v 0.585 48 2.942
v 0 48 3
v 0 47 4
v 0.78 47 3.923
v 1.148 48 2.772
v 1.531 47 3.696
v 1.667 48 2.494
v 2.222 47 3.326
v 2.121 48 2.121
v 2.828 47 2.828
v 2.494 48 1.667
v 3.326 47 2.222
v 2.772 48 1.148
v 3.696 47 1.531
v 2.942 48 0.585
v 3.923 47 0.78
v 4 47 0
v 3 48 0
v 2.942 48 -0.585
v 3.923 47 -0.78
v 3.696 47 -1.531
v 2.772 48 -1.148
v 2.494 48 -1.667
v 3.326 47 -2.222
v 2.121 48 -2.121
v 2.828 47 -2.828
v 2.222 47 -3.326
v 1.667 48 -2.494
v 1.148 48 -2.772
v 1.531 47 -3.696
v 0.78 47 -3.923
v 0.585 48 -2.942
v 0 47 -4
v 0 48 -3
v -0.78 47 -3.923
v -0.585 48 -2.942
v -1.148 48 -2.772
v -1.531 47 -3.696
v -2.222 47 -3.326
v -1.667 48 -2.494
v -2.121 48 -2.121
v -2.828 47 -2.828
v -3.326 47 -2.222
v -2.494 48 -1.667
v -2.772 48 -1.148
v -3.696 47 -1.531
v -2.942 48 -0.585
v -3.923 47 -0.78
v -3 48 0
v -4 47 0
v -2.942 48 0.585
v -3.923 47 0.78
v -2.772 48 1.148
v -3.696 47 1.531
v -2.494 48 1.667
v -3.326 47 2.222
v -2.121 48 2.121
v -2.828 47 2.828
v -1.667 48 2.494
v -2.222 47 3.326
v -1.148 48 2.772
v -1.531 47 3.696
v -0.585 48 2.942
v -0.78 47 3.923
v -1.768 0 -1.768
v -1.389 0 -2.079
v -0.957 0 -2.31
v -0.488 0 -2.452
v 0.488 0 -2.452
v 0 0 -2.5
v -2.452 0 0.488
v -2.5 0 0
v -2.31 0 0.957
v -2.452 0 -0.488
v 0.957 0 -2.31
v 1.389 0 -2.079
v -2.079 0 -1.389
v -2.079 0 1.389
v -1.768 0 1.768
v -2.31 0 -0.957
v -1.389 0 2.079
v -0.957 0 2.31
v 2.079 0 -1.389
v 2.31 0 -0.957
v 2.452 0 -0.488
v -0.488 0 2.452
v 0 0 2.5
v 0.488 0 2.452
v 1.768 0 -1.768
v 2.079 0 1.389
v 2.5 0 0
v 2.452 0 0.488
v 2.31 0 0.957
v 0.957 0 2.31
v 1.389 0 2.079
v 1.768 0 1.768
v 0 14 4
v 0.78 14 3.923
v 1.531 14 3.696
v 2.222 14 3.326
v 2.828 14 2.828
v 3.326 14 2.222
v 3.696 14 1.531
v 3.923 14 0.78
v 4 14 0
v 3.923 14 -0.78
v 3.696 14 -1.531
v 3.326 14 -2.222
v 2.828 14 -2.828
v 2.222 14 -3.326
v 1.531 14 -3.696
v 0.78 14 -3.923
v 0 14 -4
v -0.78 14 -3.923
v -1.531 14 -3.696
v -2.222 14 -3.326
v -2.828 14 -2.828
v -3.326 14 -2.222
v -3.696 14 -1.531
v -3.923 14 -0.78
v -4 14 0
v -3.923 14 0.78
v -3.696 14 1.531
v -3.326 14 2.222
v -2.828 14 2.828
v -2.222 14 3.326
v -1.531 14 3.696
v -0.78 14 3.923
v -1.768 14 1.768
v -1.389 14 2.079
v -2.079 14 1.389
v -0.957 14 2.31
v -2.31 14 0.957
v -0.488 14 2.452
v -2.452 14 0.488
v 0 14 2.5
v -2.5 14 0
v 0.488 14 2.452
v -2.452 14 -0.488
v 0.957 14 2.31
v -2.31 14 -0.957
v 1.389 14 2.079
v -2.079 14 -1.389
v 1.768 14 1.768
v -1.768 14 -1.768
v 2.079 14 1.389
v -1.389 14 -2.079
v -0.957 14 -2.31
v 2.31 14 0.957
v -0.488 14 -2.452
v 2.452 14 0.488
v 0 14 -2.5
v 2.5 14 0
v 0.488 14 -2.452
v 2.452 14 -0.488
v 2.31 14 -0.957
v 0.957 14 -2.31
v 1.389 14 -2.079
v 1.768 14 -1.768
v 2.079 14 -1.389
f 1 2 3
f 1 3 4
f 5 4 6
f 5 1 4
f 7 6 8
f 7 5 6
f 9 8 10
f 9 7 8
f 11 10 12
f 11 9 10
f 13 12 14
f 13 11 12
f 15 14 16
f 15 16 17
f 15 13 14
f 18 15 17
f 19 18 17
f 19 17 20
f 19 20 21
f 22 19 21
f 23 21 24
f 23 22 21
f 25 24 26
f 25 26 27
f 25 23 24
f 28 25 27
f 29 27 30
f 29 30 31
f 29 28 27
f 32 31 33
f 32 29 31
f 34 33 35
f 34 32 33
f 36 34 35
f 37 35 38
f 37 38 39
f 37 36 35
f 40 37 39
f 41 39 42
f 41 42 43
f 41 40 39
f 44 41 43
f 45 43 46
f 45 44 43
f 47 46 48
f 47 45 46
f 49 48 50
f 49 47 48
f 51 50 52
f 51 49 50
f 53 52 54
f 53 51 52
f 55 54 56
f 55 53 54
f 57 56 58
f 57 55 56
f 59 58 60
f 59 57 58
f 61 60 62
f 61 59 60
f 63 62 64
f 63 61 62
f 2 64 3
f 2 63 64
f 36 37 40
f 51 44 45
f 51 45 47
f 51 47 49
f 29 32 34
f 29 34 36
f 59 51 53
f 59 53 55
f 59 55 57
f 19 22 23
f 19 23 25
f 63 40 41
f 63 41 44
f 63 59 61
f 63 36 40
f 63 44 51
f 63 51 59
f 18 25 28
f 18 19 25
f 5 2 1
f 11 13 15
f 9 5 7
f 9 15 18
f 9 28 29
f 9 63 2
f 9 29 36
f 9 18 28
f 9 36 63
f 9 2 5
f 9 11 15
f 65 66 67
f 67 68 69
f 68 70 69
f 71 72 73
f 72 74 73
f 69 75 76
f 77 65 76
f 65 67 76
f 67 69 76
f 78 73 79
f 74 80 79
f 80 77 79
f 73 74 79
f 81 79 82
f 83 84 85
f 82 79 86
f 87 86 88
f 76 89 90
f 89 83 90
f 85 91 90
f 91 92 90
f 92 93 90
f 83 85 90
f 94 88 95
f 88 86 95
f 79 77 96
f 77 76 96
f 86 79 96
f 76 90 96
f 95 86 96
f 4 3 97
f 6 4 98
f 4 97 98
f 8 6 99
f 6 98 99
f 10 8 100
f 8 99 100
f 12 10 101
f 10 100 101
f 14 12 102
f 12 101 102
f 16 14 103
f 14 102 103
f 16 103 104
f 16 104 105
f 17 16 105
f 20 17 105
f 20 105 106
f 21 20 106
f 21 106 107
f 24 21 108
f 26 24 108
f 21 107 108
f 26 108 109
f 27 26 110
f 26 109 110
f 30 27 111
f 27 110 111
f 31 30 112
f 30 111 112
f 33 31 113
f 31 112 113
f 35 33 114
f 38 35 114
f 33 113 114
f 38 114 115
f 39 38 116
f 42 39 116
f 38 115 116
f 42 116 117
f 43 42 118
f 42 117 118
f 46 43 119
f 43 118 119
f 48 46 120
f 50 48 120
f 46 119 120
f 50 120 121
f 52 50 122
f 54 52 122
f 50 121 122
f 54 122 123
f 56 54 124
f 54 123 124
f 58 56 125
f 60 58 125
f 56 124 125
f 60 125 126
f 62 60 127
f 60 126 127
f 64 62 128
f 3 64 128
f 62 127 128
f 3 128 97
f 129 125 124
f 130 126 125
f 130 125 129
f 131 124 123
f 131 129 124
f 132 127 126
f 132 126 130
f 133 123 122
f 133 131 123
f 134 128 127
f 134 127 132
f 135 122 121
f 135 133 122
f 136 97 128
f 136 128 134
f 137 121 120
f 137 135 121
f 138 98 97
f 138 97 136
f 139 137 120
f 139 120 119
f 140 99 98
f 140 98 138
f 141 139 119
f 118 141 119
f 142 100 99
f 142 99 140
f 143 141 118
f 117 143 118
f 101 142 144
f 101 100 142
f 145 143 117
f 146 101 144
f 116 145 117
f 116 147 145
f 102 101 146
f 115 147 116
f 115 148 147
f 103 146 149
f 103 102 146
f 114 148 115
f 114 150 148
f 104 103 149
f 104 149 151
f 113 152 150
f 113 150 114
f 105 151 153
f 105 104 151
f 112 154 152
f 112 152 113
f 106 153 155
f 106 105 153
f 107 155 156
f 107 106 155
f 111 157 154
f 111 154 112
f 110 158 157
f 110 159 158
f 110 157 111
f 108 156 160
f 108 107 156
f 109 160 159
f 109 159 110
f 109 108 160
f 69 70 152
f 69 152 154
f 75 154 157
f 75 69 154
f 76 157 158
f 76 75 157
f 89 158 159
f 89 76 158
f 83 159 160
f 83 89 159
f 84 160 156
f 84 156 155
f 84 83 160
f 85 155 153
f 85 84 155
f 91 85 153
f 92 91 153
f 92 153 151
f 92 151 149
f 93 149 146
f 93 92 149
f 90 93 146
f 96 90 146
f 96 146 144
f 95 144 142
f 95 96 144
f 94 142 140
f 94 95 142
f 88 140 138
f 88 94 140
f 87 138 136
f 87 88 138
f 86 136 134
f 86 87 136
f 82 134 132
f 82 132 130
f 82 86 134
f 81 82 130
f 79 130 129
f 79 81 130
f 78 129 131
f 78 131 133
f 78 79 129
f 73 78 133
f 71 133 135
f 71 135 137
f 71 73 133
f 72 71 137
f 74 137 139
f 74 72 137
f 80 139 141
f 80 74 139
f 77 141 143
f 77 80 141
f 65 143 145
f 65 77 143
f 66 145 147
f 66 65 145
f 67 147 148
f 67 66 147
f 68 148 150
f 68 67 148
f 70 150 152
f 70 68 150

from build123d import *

# Parameters (mm, degrees)
SKETCH1_R           = 4
BOSS_EXTRUDE1_DEPTH = 48
SKETCH2_R           = 4
SKETCH2_R_2         = 2.5
CUT_EXTRUDE1_DEPTH  = 14
CHAMFER1_SIZE       = 1


with BuildPart() as part:
    # Sketch1 → Boss-Extrude1 (new body)
    with BuildSketch(Plane(origin=(0, 0, 0), x_dir=(1, 0, 0), z_dir=(0, 1, 0))):
        with Locations(Location((0, 0, 0), (0, 0, 270))):
            Circle(SKETCH1_R)
    extrude(amount=BOSS_EXTRUDE1_DEPTH)

    # Sketch2 → Cut-Extrude1 (cut)
    with BuildSketch(Plane.XZ):
        with Locations(Location((0, 0, 0), (0, 0, 270))):
            Circle(SKETCH2_R)
        with Locations(Location((0, 0, 0), (0, 0, 270))):
            Circle(SKETCH2_R_2, mode=Mode.SUBTRACT)
    extrude(amount=-CUT_EXTRUDE1_DEPTH, mode=Mode.SUBTRACT)

    # Chamfer1
    chamfer1_edges = [part.edges().sort_by_distance(p)[0] for p in [
        (0, 48, -4),
    ]]
    chamfer(chamfer1_edges, length=CHAMFER1_SIZE)


solid = part.part
